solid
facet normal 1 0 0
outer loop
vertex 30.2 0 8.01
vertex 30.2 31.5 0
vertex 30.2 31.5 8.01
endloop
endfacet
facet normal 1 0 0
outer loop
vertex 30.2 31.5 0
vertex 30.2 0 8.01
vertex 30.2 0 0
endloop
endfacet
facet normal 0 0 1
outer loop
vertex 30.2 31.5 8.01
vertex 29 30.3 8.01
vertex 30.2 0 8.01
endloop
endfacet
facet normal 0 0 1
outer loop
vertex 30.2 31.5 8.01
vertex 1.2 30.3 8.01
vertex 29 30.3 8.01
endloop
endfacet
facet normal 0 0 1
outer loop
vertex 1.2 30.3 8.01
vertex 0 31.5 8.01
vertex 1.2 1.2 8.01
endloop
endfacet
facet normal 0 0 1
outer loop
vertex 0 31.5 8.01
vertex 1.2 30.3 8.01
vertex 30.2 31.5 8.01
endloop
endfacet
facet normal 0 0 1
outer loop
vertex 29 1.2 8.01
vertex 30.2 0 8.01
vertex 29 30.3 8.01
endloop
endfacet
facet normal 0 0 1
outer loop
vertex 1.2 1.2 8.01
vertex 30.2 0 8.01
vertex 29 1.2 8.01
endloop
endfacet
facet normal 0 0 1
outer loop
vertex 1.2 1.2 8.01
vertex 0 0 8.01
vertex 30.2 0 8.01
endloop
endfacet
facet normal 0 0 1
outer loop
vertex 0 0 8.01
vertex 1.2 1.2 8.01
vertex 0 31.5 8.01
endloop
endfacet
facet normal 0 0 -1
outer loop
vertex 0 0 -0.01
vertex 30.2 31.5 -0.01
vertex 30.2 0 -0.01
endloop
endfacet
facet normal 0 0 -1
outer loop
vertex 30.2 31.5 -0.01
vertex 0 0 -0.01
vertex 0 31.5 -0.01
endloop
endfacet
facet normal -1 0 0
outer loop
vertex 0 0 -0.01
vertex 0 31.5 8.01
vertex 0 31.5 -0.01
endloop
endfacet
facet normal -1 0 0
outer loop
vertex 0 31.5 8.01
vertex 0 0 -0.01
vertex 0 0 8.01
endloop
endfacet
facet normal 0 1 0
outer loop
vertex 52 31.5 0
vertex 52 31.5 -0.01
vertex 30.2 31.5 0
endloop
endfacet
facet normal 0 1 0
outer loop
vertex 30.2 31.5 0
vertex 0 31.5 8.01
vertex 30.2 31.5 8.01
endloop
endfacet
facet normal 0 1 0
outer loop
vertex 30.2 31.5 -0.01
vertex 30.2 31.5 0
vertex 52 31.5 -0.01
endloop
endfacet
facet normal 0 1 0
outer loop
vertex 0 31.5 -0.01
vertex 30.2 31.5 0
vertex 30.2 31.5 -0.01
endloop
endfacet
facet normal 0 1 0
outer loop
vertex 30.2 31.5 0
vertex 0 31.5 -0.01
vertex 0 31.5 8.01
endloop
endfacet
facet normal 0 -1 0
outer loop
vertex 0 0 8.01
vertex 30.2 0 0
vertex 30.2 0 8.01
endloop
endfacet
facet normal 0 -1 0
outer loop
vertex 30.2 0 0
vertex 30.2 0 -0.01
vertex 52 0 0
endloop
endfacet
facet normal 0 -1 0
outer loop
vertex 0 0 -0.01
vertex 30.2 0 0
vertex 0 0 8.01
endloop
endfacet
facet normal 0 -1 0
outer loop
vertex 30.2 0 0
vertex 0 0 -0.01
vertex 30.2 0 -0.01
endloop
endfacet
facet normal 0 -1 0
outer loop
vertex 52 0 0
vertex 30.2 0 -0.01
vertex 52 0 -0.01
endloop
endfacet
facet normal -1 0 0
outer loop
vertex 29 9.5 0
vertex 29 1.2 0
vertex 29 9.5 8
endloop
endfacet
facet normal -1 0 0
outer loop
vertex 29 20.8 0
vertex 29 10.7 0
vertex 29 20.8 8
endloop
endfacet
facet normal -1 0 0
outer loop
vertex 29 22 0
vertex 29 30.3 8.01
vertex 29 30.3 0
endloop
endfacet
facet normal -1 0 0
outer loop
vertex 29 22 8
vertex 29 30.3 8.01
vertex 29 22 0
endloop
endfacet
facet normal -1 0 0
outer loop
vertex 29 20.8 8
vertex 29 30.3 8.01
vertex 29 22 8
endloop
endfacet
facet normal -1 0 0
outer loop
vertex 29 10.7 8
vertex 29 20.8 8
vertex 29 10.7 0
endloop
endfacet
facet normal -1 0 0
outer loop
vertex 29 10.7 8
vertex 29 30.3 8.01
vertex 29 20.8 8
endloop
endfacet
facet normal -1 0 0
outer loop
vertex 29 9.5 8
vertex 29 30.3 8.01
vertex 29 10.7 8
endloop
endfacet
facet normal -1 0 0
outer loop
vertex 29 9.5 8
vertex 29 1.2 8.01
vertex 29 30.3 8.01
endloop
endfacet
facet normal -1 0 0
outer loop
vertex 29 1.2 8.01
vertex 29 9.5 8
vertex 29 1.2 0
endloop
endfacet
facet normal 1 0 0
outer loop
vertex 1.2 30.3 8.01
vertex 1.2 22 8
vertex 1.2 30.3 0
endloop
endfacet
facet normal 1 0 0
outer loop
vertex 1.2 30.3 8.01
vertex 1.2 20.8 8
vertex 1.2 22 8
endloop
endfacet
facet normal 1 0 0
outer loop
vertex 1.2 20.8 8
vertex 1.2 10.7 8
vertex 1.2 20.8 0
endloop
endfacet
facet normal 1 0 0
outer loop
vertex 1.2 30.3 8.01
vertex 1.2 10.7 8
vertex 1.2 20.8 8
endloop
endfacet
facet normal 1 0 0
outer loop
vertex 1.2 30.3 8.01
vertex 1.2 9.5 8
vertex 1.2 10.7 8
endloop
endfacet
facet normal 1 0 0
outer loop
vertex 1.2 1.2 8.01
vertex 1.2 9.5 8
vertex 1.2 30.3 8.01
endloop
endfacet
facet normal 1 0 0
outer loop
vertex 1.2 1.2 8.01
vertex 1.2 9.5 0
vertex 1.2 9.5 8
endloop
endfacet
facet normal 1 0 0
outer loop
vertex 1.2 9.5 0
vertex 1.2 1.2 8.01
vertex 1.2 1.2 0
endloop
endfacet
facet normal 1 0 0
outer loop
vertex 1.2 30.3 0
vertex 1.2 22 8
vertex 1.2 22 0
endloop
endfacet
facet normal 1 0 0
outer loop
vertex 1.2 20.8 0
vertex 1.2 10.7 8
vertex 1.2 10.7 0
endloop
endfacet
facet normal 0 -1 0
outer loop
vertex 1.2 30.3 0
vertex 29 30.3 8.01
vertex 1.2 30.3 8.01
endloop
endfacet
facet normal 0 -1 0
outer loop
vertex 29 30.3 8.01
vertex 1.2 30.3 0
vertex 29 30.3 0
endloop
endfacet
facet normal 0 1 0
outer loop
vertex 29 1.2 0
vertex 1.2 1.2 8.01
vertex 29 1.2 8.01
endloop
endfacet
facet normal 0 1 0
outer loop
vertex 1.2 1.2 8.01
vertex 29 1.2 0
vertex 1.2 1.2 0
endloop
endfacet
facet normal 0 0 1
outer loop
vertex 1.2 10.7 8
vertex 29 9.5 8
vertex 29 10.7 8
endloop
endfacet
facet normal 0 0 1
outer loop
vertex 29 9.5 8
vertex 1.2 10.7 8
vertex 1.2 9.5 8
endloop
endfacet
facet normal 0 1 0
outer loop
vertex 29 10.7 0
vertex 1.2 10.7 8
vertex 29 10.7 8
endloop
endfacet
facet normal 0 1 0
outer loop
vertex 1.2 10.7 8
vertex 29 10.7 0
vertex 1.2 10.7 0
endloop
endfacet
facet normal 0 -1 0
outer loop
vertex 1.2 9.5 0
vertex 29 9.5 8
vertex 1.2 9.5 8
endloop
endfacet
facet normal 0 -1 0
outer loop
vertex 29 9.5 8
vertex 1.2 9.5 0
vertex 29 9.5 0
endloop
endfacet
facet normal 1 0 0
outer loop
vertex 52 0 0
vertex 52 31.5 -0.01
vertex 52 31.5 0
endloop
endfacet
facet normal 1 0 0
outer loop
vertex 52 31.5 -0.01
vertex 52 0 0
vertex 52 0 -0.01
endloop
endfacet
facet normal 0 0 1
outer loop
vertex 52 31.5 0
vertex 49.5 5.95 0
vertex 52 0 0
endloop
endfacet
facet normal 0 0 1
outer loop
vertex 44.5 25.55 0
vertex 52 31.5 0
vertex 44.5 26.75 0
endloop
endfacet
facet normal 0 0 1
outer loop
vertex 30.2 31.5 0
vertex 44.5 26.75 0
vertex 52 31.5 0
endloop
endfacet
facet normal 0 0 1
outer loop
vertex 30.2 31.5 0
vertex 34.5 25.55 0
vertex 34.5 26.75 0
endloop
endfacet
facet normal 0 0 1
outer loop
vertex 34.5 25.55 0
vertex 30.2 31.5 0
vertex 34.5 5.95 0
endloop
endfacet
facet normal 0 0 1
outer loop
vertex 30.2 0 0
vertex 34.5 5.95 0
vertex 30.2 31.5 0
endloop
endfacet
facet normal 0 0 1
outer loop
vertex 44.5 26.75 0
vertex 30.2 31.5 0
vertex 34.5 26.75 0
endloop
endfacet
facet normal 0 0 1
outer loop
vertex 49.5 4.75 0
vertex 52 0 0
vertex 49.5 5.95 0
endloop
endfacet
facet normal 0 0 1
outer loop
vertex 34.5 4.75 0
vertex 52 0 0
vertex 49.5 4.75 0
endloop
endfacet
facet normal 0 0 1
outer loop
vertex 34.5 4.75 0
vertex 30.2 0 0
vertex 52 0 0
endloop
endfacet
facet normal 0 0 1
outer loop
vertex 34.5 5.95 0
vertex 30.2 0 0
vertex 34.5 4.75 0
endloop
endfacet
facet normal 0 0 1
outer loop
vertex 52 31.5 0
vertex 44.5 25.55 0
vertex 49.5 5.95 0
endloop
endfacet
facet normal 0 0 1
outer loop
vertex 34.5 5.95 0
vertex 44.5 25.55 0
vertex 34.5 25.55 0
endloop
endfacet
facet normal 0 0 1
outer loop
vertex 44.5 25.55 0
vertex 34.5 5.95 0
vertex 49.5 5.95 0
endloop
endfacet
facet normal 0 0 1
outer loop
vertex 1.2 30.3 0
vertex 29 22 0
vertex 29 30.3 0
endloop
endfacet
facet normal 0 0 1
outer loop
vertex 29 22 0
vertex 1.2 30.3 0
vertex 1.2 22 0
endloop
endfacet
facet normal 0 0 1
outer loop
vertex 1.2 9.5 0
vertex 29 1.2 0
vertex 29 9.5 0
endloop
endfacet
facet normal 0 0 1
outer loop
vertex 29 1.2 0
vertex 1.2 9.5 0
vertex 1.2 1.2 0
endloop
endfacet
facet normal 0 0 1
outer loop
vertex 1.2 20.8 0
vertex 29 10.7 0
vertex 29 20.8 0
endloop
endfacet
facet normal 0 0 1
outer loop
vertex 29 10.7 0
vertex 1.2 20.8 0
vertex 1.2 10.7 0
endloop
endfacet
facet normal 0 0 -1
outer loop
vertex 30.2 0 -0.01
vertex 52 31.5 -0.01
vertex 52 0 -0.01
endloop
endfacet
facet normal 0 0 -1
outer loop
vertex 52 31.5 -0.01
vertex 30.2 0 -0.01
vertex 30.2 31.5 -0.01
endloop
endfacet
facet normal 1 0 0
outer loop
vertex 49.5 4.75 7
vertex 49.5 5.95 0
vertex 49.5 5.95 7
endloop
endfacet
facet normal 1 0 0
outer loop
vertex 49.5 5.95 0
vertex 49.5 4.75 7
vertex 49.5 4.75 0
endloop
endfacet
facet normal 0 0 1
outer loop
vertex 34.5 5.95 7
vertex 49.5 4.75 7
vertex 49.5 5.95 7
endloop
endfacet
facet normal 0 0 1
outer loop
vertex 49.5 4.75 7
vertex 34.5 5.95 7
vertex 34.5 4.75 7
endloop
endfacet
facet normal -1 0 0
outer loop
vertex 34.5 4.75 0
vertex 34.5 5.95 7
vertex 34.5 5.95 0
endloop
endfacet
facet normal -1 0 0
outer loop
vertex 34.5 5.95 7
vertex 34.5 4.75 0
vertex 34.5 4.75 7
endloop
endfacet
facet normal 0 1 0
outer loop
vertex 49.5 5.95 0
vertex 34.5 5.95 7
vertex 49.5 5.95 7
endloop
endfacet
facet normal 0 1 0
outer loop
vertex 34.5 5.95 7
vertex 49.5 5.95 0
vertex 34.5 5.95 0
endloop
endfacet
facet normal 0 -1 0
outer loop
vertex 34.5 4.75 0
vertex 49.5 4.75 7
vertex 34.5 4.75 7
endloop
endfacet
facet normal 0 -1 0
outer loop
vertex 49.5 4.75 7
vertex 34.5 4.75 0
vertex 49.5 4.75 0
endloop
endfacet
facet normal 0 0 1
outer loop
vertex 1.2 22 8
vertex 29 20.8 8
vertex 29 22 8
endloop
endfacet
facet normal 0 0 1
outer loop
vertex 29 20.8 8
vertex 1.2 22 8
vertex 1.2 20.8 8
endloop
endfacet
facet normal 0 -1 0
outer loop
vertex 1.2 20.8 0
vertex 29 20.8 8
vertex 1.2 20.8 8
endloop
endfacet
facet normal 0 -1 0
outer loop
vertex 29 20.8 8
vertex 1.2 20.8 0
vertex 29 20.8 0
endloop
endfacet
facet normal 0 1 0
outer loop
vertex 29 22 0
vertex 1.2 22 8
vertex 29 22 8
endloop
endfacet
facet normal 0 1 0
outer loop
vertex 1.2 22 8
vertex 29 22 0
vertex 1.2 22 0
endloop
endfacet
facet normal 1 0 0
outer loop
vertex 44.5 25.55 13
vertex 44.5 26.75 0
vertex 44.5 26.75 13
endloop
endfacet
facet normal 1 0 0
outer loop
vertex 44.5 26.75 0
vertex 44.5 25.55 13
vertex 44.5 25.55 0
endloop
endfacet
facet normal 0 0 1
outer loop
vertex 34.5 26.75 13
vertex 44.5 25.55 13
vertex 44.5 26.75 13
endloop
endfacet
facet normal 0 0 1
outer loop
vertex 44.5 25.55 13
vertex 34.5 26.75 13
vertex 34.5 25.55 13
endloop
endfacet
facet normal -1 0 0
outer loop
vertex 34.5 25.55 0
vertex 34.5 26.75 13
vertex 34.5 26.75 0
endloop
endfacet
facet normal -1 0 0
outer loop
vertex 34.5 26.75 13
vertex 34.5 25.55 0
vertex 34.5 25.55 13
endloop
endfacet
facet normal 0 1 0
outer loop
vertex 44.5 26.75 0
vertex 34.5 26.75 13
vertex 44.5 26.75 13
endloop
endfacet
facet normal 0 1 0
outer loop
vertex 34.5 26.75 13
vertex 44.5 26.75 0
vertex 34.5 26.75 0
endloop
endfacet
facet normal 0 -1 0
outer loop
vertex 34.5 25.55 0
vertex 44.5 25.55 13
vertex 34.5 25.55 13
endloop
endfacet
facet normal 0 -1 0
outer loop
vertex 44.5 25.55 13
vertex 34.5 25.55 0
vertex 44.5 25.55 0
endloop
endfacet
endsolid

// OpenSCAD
// file: ../Base/Boxes.scad
// Fischertechnik Box Foundation
// Pre-designed Boxes

use <Constants.scad>

include <PlacementOptions.scad>

box190Width = 190;
box190Depth = 130;
box130Width = 130;
box130Depth = 95;

// Values are from an original ec3 box
topBottomDifference = 1.5;
outerHeight = 40;
baseThickness = 1.8;
innerHeight = outerHeight - baseThickness;
stackExcess = 5.7;
radius = 3.5;
wallThickness = 1.5;
tolerance = 0.2;

boxWallThickness = wallThickness;
boxBaseThickness = baseThickness;
boxWebWidth = 3.0;

// getBoxWallThickness()
// Gets the wall thickness of a Fischertechnik Box
function getBoxWallThickness() = boxWallThickness;

// getBoxUsageHeight(height = 38.2)
// Gets the usable height of a Fischertechnik box
// height = Outer height of the box from the bottom to the upper edge.
function getBoxUsageHeight(height = outerHeight) = height - baseThickness - stackExcess;

// getBoxInnerHeight()
// Gets the inner height of a Fischertechnik box, including the stack excess
function getBoxInnerHeight() = innerHeight;

// getBoxBaseThickness()
// Gets the thickness of the Fischertechnik box base.
function getBoxBaseThickness() = boxBaseThickness;

// getBoxWebWidth()
// Gets the width of a box web
function getBoxWebWidth() = boxWebWidth;

// getBox190Space()
// Gets the usable inner space of a Box 190 as an x/y-list
function getBox190Space() = [
    box190Width - 2*getBoxWallThickness() - topBottomDifference, 
    box190Depth - 2*getBoxWallThickness() - topBottomDifference ];

// RoundedCornerPlate(width, depth, height, radius)
// Creates a body plate with rounded corners for a box. Used
// also to create the complete box with the hull module.
// width = Width of the plate
// depth = depth of the plate 
// height = thickness of the plate
// radius = radius of the rounded corner
module RoundedCornerPlate(width, depth, height, radius) {
    translate([radius, radius])
    hull() {
        w = width-2*radius;
        d = depth-2*radius;
        cube([w, d, height]);
        cylinder(height, r=radius, $fn=getFragments());
        translate([w, 0])
            cylinder(height, r=radius, $fn=getFragments());
        translate([w, d])
            cylinder(height, r=radius, $fn=getFragments());
        translate([0, d])
            cylinder(height, r=radius, $fn=getFragments());
    }
}

// BoxBase(width, depth)
// Creates an empty stackable Fischertechnik compatible box
// width = Outer width of the box (190, 130, ...)
// depth = Outer depth of the box (130, 95, ...)

module BoxBase(width, depth, height=outerHeight) {    
    thinPlate = 0.01;

    innerHeight = height - baseThickness;    
    
    module Body(tolerance=tolerance) {
        hull() {
            // Bottom with tolerance to fit into the original boxes when stacked
            translate([-wallThickness+tolerance, -wallThickness+tolerance, -baseThickness])
                RoundedCornerPlate(width-topBottomDifference-2*tolerance, depth-topBottomDifference-2*tolerance, thinPlate, radius);
            
            // Top
            translate([-wallThickness-topBottomDifference/2, -wallThickness-topBottomDifference/2, innerHeight-thinPlate])
                RoundedCornerPlate(width, depth, thinPlate, radius);
         }
    }

    module Cutoff() {
        hull() {
            coWidth = width - 2*wallThickness;
            coDepth = depth - 2*wallThickness;
            
            // Bottom
            RoundedCornerPlate(coWidth-topBottomDifference, coDepth-topBottomDifference, thinPlate, radius);

            // Top
            translate([-topBottomDifference/2, -topBottomDifference/2, innerHeight+thinPlate]) 
                RoundedCornerPlate(coWidth, coDepth, thinPlate, radius);
        }
    }
    
    difference() {        
        Body();
        Cutoff();
        stackOffset = innerHeight - stackExcess;
        translate([0, 0, stackOffset + baseThickness])
            Body(tolerance=0);
    }
}

// Creates the Fischertechnik empty box 130x190 mm and places it at position 0,0
// 190x130 are the outer sizes, the inner space is slightly smaller. Use getBox190Space() to get the inner sizes.
// The box is positioned that the usable inner space is at the 0,0,0 position.

module Box190() {
    BoxBase(box190Width, box190Depth);
}

// Gets the usable inner space of a Box 130 as an x/y-list
function getBox130Space() = [
    box130Width - 2*getBoxWallThickness() - topBottomDifference, 
    box130Depth - 2*getBoxWallThickness() - topBottomDifference ];

// Creates the Fischertechnik empty box 95x130 mm and places it at position 0,0
// 190x130 are the outer sizes, the inner space is slightly smaller. Use getBox190Space() to get the inner sizes.
// The box is positioned that the usable inner space is at the 0,0,0 position.

module Box130() {
    BoxBase(box130Width, box130Depth);
}

// Creates a web at the specified box walls
// corner 0 = LowerLeft, 1 = UpperLeft, 2 = UpperRight, 3 = LowerRight
// side 0 = LeftOfCorner, 1 = RightOfCorner
// distance = Distance in mm from the corner
// boxSpace = inner width and depth of the box (default: Box 190)
// webWidth = length of the web (default is 3 mms)
// webThickness = thickness of the web (default is 1 mm)
// height = Height of the web (standard is getBoxUsageHeight())
// sink = How much of the web is sunk into the wall

module BoxWeb(
    corner, 
    side, 
    distance, 
    boxSpace=getBox190Space(), 
    webWidth=getBoxWebWidth(), 
    webThickness=1.0, 
    height=getBoxUsageHeight(),
    sink = getBoxWallThickness()/2) {
    width = (corner % 2 == 0) ? 
            (side == LeftOfCorner ? webWidth : webThickness) :
            (side == LeftOfCorner ? webThickness : webWidth);

    depth = (corner % 2 == 0) ? 
            (side == RightOfCorner ? webWidth : webThickness) :
            (side == RightOfCorner ? webThickness : webWidth);
    
    xDiff = corner == LowerLeft ? 
                (side == LeftOfCorner ? -sink : distance) :
            (corner == UpperLeft ?                
                (side == LeftOfCorner ? distance : -sink) :
            (corner == UpperRight ?
                (side == LeftOfCorner ? boxSpace.x-webWidth+sink : boxSpace.x-distance-webThickness) :
                (side == LeftOfCorner ? boxSpace.x-distance-webThickness: boxSpace.x-webWidth+sink)));

    yDiff = corner == LowerLeft ? 
                (side == RightOfCorner ? -sink : distance) :
            (corner == UpperLeft ?
                (side == RightOfCorner ? boxSpace.y-distance-webThickness : boxSpace.y-webWidth+sink) :
            (corner == UpperRight ?
                (side == RightOfCorner ? boxSpace.y-webWidth+sink : boxSpace.y-distance-webThickness) :
                (side == RightOfCorner ? distance : -sink)));
    
    translate([xDiff, yDiff, -getExcess()])
        cube([width, depth, height + 2*getExcess()]);
}
// file: ../Base/Rotation.scad
// Fischertechnik Box Foundation
// Geometry Helpers Rotation

include <PlacementOptions.scad>

// getRotatedSpace(space, rotation=NoRotation)
// Rotates the space dependent on the specified rotation

function getRotatedSpace(space, rotation=NoRotation) = [
    (rotation == Rotate90 || rotation == Rotate270) ? space.y : space.x,
    (rotation == Rotate90 || rotation == Rotate270) ? space.x : space.y
];

// Rotates the given space around the fixed left lower corner
// space = the space the children needs as width/depth list [width,depth]
// rotation = 0 Rotate0 degrees, 1 Rotate90 degrees, 2 Rotate180 degrees, 3 Rotate270 degrees (equivalent to -90)

module RotateFix(space, rotation=NoRotation) {
    dy = (rotation == Rotate0 || rotation == Rotate270) ? 0 :
        (rotation == Rotate90) ? space.x :
        space.y;
    dx = (rotation < Rotate180) ? 0 :
        (rotation == Rotate180) ? space.x :
        space.y;
    
    translate([dx, dy, 0])
        rotate([0, 0, rotations[rotation]])
            children();
}
// file: ../Base/Alignment.scad
// Fischertechnik Box Foundation
// Geometry Helpers Alignment

include <PlacementOptions.scad>

// getAlignedX(elementWidth, spaceWidth, align=AlignRight, offset=0)
// Gets the aligned X offset of an element with the given
// width in the given space.
// elementWidth = The width of the element to positon
// spaceWidth = The space where the element should be aligned
// align = 0 AlignLeft, 1 AlignCenter, 2 AlignRight
// offset = an optional offset from the aligned position. When
// aligned left or centered, then positive values are in X direction.
// When aligned right then positive values are in negative X direction.

function getAlignedX(elementWidth, spaceWidth, align=AlignRight, offset=0) =
    (align == AlignLeft) ?
        offset :
        ((align == AlignCenter) ?
        (spaceWidth - elementWidth)/2 + offset :
        spaceWidth - offset - elementWidth);

// getAlignedY(elementDepth, spaceDepth, align=AlignTop, offset=0)
// Gets the aligned Y offset of an element with the given
// depth in the given space.
// elementDepth = The depth of the element to positon
// spaceDepth = The space where the element should be aligned
// align = 0 AlignBottom, 1 AlignCenter, 2 AlignTop
// offset = an optional offset from the aligned position. When
// aligned bottom or centered, then positive values are in Y direction.
// When aligned top then positive values are in negative Y direction.

function getAlignedY(elementDepth, spaceDepth, align=AlignTop, offset=0) =
    (align == AlignBottom) ?
        offset :
        ((align == AlignCenter) ?
        (spaceDepth - elementDepth)/2 + offset :
        spaceDepth - offset - elementDepth);
// file: ../Base/Placement.scad
// Fischertechnik Box Foundation
// Geometry Helpers Placement

use <Constants.scad>
use <Alignment.scad>
use <Rotation.scad>
use <Boxes.scad>

include <PlacementOptions.scad>

// Place(x=0, y=0, elementSpace=[0,0], alignX=AlignLeft, alignY=AlignBottom, rotation=Rotate0, boxSpace=getBox190Space())
// Places the child at the specified position
// y = Y-Position. This is a relative position when an X aligment is specified.
// x = X-Position. This is a relative position when an Y aligment is specified.
// elementSpace = space of the element to be placed [x,y]
// alignX = -1=NoAlign, 0 AlignLeft, 1 AlignCenter, 3 AlignRight (elementSpace and boxSpace required!)
// alignY = -1=NoAlign, 2 AlignBottom, 1 AlignCenter, 4 AlignTop (elementSpace and boxSpace required!)
// rotation = 0 Rotate0 0 degrees, 1 Rotate90 90 degrees, 
// 2 Rotate180 180 degrees, 3 Rotate270 270 degrees (equivalent to -90)
// boxSpace = Inner space of the box where the placement occurs [x,y] - default is Box 190x130 inner space

module Place(x=0, y=0, elementSpace=[0,0], 
  alignX=AlignLeft, alignY=AlignBottom, 
  rotation=NoRotation, boxSpace=getBox190Space()) {

    module Position(x, y, space, rotation=Rotate0) {
        translate([x, y, 0])
            RotateFix(space, rotation)
                children();
    }

    space = getRotatedSpace(elementSpace, rotation);
    alignedX = getAlignedX(space.x, boxSpace.x, alignX, x);
    alignedY = getAlignedY(space.y, boxSpace.y, alignY, y);
    Position(alignedX, alignedY, elementSpace, rotation)
        children();
}

// Center(space=getBox130Space(), elementSpace=[0,0])
// space = Space where the children is centered. For cylinder use centered=true and no elementSpace.
// elementSpace = space of the element to be centered [x,y]

module Center(space=getBox190Space(), elementSpace=[0,0]) {
    Place(elementSpace=elementSpace, boxSpace=space, alignX=AlignCenter, alignY=AlignCenter)
        children();
}

// CenterHorizontal(width=0, y=0, offset=0, space=getBox130Space())
// width = Width of the element to be placed.
// y = Y position of the element
// offset = Offset from the center position (negative will be left of the center)
// space = Space where the element is placed

module CenterHorizontal(width=0, y=0, offset=0, space=getBox190Space()) {
    Place(x=offset, y=y, elementSpace=[width, 0], boxSpace=space, alignX=AlignCenter)
        children(0);
}

// CenterVertical(depth=0, x=0, offset=0, space=getBox130Space())
// depth = Depth of the element to be placed.
// x = X position of the element
// offset = Offset from the center position (negative will be down of the center)
// space = Space where the element is placed

module CenterVertical(depth=0, x=0, offset=0, space=getBox190Space()) {
    Place(x=x, y=offset, elementSpace=[0, depth], boxSpace=space, alignY=AlignCenter)
        children(0);
}

// getIsVertical(align)
// True if the specified alignment needs a vertical orientation for a divider (AlignRight, AlignLeft)

function getIsVertical(align) = (align == AlignRight || align == AlignLeft);

// getIsHorizontal(align)
// True if the specified alignment needs a horizontal orientation for a divider (AlignTop, AlignBottom)

function getIsHorizontal(align) = (align == AlignTop || align == AlignBottom);
// file: ../Base/Helper.scad
// Fischertechnik Box Foundation
// Helper functions

include <PlacementOptions.scad>

// getRotation(rotations, i)
// gets the rotation with index i, even if rotations or rotations[i] is undefined.
// If undefined, NoRotation ist returned.
// rotations = list of Rotate-constants
// i = Index of the rotation
function getRotation(rotations, i) = (is_undef(rotations) || is_undef(rotations[i])) ? NoRotation : rotations[i];
// file: ../Base/PlacementOptions.scad
// Fischertechnik Box Foundation
// Placement Options

// Alignment
NoAlign = 0;
AlignLeft = 1;
AlignBottom = 2;
AlignCenter = 3;
AlignRight = 4;
AlignTop = 5;

// Element rotation degree steps
rotations = [0, -90, -180, -270];

// Rotation
NoRotation = 0;
Rotate0 = 0;
Rotate90 = 1;
Rotate180 = 2;
Rotate270 = 3;

// Docking (seen from above)
NoDock = -1;
DockLeft = 0;
DockTop = 1;
DockRight = 2;
DockCorner = 2;
DockBottom = 3;

// Web corners
LowerLeft = 0;
UpperLeft = 1;
UpperRight = 2;
LowerRight = 3;

// Web position relative to corner
LeftOfCorner = 0;
RightOfCorner = 1;
// file: FrameBracketWithoutWorm.scad
// Fischertechnik Box Library
// Frame  for bracket without worm
// 31046

use <../Base/Constants.scad>
use <../ModelBase/Complex.scad>

// getFrameBracketWithoutWormSpace()
// Gets the space for a frame for a bracket with worm.

function getFrameBracketWithoutWormSpace() = getFrameBracketSpace();

// FrameBracketWithoutWorm()
// Frame for bracket with worm.

module FrameBracketWithoutWorm() {
    FrameBracket([ 10, getDividerThickness(), 13 ]);
}

// Test
color("lightgray")
FrameBracketWithoutWorm();
// file: FrameBracketWithWorm.scad
// Fischertechnik Box Library
// Frame  for bracket with worm
// 31045

use <../Base/Constants.scad>
use <../ModelBase/Complex.scad>

// getFrameBracketWithWormSpace()
// Gets the space for a frame for a bracket with worm.

function getFrameBracketWithWormSpace() = getFrameBracketSpace();

// FrameBracketWithWorm()
// Frame for bracket with worm.

module FrameBracketWithWorm() {
    FrameBracket([ 15, getDividerThickness(), 7 ]);
}

// Test
color("lightgray")
FrameBracketWithWorm();
// file: ../Base/Constants.scad
// Fischertechnik Box Foundation
// Constants

// Constant values necessary for multiple elements

// Base constants
dividerThickness = 1.2;
excess = 0.01;
fragments = 90;
tolerance = 0.8;

// Gets the thickness of a divider 
function getDividerThickness() = dividerThickness;

// Gets the excess that is used to merge walls into each other
function getExcess() = excess;

// Gets amount of fragments of a cylinder
function getFragments() = fragments;

// Gets the inner tolerance of a frame to each side
function getTolerance() = tolerance;


// Fischertechnik specific constants
axisDiameter = 4;
axisBottomDiameter = axisDiameter + 1;
axisTolerance = 0.2;

// Gets axis diameter of Fischertechnik axis
function getAxisDiameter() = axisDiameter;

// Gets axis diameter tolerance (subtracted for element axis)
function getAxisTolerance() = axisTolerance;

// Gets the axis diameter for standing axis
function getStandAxisDiameter() = getAxisDiameter() - getAxisTolerance();

// Gets axis bottom diameter for thicker part at the bottom
function getAxisBottomDiameter() = axisBottomDiameter;

pinHeight = 2.5;

// gets the height of a connecting pin
function getPinHeight() = pinHeight;

standardEdgeDistance = 2.5;
standardWebDistance = 11.5;
standardCornerLength = 15;

// gets the standard distance to the wall of the box for dockable frames with webs
function getStandardEdgeDistance() = standardEdgeDistance;

// gets the standard distance of each web to the corner of the dockable frame
function getStandardWebDistance() = standardWebDistance;

// gets the standard length of the corner walls of a dockable frame
function getStandardCornerLength() = standardCornerLength;

tubeWallFactor = 0.8;

// gets the wall thickness of a tube.
function getTubeWallThickness() = tubeWallFactor * getDividerThickness();

smallPartsFrameHeight = 20;

// gets the frame height for docked small parts boxes.
function getSmallPartsFrameHeight() = smallPartsFrameHeight;

hubRingDiameter = 19.5;
hubRingLevelDiameter = 21;

// gets the diameter of a tube matching the inner ring of a wheel
function getHubRingDiameter() = hubRingDiameter;

// gets the diameter of a hub tube with a thicker diameter
function getHubRingLevelDiameter() = hubRingLevelDiameter;
// main file
// Fischertechnik Box Library
// Frames for brackets with and without worm
// 31045 + 31046

use <../Base/Constants.scad>
use <../Base/Deployment.scad>
use <../ModelBase/Simple.scad>
use <../ModelBase/Complex.scad>
use <FrameBracketWithWorm.scad>
use <FrameBracketWithoutWorm.scad>

include <../Base/PlacementOptions.scad>

/* [Hidden] */
outerDepth = 31.5;

// getComboFrameBracketsSpace()
// Gets the space for a frame for a combination of brackets with worm and without worm.

function getComboFrameBracketsSpace() = [getFrameBracketSpace().x, outerDepth];

// ComboFrameBrackets()
// Frame for a combination of brackets with worm and without worm.

module ComboFrameBrackets() {
    Space(getComboFrameBracketsSpace());
    Frame([getFrameBracketWidth(), outerDepth - 2*getDividerThickness() - getTolerance(), getFrameBracketSpace().z]);
    DeployVertical(outerDepth, [getFrameBracketWithWormSpace(), getFrameBracketWithoutWormSpace()], [Rotate0, Rotate0]) {
        FrameBracketWithWorm();
        FrameBracketWithoutWorm();
    }
}

// Test
color("lightgray")
ComboFrameBrackets();
